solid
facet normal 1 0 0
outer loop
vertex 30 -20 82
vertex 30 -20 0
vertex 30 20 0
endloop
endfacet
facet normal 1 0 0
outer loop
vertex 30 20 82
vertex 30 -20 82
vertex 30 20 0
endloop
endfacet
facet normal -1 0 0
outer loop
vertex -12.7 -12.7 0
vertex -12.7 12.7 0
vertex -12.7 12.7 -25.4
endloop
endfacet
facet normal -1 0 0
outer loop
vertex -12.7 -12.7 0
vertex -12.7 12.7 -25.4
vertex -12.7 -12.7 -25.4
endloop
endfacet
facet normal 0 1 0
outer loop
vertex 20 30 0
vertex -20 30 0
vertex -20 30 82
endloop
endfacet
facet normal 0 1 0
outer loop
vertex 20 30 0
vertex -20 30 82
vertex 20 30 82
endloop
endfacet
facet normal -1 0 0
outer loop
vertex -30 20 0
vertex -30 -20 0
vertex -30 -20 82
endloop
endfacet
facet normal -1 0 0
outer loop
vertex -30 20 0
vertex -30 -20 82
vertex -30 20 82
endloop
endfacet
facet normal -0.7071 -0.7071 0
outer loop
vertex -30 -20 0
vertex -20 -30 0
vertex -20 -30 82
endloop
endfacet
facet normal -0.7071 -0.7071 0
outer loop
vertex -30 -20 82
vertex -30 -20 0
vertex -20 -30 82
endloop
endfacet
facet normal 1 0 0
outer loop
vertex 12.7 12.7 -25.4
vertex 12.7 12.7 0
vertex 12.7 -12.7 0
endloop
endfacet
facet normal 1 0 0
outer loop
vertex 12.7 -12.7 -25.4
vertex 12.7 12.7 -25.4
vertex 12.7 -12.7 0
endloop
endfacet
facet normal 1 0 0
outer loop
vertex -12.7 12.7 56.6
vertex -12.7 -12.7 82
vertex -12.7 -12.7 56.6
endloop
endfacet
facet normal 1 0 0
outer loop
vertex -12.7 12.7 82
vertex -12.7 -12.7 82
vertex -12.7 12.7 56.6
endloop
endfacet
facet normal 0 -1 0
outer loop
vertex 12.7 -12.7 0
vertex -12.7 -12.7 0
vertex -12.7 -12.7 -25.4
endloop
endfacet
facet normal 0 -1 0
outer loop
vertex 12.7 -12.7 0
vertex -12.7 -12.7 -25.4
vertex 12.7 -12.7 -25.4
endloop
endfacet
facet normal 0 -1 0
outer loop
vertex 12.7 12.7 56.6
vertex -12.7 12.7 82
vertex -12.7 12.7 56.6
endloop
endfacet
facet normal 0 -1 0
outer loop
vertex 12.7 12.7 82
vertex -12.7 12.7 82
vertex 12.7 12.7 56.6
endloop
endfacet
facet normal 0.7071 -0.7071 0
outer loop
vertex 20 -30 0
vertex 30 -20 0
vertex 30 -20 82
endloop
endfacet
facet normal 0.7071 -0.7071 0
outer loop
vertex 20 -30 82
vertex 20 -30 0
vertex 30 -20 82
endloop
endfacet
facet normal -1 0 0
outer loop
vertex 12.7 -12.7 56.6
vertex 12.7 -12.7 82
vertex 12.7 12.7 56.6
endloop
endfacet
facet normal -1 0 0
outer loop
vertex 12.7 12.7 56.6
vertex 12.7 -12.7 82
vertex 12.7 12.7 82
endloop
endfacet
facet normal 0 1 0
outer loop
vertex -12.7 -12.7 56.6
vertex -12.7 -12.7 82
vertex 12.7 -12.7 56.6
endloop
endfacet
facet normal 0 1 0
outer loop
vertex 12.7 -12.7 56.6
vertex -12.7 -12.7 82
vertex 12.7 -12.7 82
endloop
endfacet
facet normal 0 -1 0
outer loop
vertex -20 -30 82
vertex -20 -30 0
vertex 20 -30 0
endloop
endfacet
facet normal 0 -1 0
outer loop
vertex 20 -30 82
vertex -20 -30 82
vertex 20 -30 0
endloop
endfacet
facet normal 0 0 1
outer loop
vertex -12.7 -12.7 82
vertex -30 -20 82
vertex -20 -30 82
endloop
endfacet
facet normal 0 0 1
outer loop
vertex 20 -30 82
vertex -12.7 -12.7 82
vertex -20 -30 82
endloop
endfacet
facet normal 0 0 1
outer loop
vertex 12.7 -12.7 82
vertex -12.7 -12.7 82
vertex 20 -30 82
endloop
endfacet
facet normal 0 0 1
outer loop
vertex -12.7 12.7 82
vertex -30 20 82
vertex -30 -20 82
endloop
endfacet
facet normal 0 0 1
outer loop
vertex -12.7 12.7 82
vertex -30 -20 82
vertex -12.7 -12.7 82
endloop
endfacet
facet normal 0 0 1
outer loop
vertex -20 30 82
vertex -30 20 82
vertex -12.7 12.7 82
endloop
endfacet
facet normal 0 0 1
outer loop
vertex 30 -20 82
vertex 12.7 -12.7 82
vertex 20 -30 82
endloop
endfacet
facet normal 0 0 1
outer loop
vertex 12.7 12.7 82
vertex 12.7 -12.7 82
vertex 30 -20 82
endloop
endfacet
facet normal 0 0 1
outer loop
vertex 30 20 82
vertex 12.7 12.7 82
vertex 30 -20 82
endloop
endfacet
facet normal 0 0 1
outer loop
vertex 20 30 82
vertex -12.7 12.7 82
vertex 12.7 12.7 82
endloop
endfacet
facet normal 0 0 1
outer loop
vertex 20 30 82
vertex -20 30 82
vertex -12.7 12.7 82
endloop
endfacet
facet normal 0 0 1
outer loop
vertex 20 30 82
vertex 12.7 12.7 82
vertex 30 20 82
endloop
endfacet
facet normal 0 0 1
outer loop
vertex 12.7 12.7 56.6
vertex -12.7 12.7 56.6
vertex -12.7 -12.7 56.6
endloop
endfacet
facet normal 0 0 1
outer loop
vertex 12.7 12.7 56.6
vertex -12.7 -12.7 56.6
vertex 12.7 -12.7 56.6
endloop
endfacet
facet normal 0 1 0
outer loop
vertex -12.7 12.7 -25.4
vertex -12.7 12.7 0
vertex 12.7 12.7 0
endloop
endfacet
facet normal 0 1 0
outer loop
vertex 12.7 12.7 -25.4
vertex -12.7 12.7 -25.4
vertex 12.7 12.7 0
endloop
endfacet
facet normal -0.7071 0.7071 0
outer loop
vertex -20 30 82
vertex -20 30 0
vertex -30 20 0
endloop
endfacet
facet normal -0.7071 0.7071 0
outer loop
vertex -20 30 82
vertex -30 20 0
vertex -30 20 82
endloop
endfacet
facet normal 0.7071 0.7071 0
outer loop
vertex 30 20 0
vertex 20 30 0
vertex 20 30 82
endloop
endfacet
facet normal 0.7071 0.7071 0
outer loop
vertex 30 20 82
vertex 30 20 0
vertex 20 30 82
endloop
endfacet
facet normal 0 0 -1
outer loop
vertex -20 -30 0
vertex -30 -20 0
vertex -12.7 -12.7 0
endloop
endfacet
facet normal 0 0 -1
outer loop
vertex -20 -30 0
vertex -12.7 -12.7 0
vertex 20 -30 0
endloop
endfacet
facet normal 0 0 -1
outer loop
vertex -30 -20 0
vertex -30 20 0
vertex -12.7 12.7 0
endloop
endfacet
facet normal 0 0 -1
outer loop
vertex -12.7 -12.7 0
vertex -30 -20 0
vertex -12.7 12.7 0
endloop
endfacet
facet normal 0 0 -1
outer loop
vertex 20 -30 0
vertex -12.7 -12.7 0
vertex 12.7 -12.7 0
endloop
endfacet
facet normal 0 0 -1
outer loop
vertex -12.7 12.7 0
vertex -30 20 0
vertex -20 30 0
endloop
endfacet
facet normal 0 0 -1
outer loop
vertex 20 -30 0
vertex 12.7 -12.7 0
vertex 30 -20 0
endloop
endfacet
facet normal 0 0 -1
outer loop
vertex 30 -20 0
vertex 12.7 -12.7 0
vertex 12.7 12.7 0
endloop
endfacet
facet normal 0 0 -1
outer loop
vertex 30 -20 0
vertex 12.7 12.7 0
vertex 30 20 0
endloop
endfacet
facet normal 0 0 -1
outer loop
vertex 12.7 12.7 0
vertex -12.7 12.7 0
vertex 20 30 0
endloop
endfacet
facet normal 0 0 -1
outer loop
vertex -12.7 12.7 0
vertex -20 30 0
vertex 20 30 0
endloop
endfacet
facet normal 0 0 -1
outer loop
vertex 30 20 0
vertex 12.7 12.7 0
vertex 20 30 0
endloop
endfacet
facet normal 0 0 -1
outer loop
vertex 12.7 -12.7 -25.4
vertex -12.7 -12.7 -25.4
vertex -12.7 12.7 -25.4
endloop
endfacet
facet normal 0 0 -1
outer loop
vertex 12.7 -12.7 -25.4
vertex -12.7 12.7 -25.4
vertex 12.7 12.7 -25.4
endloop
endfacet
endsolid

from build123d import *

# Parameters (mm, degrees)
F0_W     = 60
F0_H     = 60
F1_DEPTH = 82
F2_SIZE  = 10
F3_W     = 25.4
F3_H     = 25.4
F4_DEPTH = 25.4
F5_W     = 25.4
F5_H     = 25.4
F6_DEPTH = 25.4


with BuildPart() as f1:
    # F0 (on Top) → F1 (new body)
    with BuildSketch(Plane.XY):
        Rectangle(F0_W, F0_H)
    extrude(amount=F1_DEPTH)

    # F2
    f2_edges = [f1.edges().sort_by_distance(p)[0] for p in [
        (30, -30, 41),
        (30, 30, 41),
        (-30, -30, 41),
        (-30, 30, 41),
    ]]
    chamfer(f2_edges, length=F2_SIZE)

    # F3 (on face) → F4 (cut)
    with BuildSketch(Plane.XY.offset(82)):
        Rectangle(F3_W, F3_H)
    extrude(amount=-F4_DEPTH, mode=Mode.SUBTRACT)

    # F5 (on face) → F6 (join)
    with BuildSketch(Plane(origin=(0, 0, 0), x_dir=(1, 0, 0), z_dir=(0, 0, -1))):
        Rectangle(F5_W, F5_H)
    extrude(amount=F6_DEPTH)


solid = f1.part
